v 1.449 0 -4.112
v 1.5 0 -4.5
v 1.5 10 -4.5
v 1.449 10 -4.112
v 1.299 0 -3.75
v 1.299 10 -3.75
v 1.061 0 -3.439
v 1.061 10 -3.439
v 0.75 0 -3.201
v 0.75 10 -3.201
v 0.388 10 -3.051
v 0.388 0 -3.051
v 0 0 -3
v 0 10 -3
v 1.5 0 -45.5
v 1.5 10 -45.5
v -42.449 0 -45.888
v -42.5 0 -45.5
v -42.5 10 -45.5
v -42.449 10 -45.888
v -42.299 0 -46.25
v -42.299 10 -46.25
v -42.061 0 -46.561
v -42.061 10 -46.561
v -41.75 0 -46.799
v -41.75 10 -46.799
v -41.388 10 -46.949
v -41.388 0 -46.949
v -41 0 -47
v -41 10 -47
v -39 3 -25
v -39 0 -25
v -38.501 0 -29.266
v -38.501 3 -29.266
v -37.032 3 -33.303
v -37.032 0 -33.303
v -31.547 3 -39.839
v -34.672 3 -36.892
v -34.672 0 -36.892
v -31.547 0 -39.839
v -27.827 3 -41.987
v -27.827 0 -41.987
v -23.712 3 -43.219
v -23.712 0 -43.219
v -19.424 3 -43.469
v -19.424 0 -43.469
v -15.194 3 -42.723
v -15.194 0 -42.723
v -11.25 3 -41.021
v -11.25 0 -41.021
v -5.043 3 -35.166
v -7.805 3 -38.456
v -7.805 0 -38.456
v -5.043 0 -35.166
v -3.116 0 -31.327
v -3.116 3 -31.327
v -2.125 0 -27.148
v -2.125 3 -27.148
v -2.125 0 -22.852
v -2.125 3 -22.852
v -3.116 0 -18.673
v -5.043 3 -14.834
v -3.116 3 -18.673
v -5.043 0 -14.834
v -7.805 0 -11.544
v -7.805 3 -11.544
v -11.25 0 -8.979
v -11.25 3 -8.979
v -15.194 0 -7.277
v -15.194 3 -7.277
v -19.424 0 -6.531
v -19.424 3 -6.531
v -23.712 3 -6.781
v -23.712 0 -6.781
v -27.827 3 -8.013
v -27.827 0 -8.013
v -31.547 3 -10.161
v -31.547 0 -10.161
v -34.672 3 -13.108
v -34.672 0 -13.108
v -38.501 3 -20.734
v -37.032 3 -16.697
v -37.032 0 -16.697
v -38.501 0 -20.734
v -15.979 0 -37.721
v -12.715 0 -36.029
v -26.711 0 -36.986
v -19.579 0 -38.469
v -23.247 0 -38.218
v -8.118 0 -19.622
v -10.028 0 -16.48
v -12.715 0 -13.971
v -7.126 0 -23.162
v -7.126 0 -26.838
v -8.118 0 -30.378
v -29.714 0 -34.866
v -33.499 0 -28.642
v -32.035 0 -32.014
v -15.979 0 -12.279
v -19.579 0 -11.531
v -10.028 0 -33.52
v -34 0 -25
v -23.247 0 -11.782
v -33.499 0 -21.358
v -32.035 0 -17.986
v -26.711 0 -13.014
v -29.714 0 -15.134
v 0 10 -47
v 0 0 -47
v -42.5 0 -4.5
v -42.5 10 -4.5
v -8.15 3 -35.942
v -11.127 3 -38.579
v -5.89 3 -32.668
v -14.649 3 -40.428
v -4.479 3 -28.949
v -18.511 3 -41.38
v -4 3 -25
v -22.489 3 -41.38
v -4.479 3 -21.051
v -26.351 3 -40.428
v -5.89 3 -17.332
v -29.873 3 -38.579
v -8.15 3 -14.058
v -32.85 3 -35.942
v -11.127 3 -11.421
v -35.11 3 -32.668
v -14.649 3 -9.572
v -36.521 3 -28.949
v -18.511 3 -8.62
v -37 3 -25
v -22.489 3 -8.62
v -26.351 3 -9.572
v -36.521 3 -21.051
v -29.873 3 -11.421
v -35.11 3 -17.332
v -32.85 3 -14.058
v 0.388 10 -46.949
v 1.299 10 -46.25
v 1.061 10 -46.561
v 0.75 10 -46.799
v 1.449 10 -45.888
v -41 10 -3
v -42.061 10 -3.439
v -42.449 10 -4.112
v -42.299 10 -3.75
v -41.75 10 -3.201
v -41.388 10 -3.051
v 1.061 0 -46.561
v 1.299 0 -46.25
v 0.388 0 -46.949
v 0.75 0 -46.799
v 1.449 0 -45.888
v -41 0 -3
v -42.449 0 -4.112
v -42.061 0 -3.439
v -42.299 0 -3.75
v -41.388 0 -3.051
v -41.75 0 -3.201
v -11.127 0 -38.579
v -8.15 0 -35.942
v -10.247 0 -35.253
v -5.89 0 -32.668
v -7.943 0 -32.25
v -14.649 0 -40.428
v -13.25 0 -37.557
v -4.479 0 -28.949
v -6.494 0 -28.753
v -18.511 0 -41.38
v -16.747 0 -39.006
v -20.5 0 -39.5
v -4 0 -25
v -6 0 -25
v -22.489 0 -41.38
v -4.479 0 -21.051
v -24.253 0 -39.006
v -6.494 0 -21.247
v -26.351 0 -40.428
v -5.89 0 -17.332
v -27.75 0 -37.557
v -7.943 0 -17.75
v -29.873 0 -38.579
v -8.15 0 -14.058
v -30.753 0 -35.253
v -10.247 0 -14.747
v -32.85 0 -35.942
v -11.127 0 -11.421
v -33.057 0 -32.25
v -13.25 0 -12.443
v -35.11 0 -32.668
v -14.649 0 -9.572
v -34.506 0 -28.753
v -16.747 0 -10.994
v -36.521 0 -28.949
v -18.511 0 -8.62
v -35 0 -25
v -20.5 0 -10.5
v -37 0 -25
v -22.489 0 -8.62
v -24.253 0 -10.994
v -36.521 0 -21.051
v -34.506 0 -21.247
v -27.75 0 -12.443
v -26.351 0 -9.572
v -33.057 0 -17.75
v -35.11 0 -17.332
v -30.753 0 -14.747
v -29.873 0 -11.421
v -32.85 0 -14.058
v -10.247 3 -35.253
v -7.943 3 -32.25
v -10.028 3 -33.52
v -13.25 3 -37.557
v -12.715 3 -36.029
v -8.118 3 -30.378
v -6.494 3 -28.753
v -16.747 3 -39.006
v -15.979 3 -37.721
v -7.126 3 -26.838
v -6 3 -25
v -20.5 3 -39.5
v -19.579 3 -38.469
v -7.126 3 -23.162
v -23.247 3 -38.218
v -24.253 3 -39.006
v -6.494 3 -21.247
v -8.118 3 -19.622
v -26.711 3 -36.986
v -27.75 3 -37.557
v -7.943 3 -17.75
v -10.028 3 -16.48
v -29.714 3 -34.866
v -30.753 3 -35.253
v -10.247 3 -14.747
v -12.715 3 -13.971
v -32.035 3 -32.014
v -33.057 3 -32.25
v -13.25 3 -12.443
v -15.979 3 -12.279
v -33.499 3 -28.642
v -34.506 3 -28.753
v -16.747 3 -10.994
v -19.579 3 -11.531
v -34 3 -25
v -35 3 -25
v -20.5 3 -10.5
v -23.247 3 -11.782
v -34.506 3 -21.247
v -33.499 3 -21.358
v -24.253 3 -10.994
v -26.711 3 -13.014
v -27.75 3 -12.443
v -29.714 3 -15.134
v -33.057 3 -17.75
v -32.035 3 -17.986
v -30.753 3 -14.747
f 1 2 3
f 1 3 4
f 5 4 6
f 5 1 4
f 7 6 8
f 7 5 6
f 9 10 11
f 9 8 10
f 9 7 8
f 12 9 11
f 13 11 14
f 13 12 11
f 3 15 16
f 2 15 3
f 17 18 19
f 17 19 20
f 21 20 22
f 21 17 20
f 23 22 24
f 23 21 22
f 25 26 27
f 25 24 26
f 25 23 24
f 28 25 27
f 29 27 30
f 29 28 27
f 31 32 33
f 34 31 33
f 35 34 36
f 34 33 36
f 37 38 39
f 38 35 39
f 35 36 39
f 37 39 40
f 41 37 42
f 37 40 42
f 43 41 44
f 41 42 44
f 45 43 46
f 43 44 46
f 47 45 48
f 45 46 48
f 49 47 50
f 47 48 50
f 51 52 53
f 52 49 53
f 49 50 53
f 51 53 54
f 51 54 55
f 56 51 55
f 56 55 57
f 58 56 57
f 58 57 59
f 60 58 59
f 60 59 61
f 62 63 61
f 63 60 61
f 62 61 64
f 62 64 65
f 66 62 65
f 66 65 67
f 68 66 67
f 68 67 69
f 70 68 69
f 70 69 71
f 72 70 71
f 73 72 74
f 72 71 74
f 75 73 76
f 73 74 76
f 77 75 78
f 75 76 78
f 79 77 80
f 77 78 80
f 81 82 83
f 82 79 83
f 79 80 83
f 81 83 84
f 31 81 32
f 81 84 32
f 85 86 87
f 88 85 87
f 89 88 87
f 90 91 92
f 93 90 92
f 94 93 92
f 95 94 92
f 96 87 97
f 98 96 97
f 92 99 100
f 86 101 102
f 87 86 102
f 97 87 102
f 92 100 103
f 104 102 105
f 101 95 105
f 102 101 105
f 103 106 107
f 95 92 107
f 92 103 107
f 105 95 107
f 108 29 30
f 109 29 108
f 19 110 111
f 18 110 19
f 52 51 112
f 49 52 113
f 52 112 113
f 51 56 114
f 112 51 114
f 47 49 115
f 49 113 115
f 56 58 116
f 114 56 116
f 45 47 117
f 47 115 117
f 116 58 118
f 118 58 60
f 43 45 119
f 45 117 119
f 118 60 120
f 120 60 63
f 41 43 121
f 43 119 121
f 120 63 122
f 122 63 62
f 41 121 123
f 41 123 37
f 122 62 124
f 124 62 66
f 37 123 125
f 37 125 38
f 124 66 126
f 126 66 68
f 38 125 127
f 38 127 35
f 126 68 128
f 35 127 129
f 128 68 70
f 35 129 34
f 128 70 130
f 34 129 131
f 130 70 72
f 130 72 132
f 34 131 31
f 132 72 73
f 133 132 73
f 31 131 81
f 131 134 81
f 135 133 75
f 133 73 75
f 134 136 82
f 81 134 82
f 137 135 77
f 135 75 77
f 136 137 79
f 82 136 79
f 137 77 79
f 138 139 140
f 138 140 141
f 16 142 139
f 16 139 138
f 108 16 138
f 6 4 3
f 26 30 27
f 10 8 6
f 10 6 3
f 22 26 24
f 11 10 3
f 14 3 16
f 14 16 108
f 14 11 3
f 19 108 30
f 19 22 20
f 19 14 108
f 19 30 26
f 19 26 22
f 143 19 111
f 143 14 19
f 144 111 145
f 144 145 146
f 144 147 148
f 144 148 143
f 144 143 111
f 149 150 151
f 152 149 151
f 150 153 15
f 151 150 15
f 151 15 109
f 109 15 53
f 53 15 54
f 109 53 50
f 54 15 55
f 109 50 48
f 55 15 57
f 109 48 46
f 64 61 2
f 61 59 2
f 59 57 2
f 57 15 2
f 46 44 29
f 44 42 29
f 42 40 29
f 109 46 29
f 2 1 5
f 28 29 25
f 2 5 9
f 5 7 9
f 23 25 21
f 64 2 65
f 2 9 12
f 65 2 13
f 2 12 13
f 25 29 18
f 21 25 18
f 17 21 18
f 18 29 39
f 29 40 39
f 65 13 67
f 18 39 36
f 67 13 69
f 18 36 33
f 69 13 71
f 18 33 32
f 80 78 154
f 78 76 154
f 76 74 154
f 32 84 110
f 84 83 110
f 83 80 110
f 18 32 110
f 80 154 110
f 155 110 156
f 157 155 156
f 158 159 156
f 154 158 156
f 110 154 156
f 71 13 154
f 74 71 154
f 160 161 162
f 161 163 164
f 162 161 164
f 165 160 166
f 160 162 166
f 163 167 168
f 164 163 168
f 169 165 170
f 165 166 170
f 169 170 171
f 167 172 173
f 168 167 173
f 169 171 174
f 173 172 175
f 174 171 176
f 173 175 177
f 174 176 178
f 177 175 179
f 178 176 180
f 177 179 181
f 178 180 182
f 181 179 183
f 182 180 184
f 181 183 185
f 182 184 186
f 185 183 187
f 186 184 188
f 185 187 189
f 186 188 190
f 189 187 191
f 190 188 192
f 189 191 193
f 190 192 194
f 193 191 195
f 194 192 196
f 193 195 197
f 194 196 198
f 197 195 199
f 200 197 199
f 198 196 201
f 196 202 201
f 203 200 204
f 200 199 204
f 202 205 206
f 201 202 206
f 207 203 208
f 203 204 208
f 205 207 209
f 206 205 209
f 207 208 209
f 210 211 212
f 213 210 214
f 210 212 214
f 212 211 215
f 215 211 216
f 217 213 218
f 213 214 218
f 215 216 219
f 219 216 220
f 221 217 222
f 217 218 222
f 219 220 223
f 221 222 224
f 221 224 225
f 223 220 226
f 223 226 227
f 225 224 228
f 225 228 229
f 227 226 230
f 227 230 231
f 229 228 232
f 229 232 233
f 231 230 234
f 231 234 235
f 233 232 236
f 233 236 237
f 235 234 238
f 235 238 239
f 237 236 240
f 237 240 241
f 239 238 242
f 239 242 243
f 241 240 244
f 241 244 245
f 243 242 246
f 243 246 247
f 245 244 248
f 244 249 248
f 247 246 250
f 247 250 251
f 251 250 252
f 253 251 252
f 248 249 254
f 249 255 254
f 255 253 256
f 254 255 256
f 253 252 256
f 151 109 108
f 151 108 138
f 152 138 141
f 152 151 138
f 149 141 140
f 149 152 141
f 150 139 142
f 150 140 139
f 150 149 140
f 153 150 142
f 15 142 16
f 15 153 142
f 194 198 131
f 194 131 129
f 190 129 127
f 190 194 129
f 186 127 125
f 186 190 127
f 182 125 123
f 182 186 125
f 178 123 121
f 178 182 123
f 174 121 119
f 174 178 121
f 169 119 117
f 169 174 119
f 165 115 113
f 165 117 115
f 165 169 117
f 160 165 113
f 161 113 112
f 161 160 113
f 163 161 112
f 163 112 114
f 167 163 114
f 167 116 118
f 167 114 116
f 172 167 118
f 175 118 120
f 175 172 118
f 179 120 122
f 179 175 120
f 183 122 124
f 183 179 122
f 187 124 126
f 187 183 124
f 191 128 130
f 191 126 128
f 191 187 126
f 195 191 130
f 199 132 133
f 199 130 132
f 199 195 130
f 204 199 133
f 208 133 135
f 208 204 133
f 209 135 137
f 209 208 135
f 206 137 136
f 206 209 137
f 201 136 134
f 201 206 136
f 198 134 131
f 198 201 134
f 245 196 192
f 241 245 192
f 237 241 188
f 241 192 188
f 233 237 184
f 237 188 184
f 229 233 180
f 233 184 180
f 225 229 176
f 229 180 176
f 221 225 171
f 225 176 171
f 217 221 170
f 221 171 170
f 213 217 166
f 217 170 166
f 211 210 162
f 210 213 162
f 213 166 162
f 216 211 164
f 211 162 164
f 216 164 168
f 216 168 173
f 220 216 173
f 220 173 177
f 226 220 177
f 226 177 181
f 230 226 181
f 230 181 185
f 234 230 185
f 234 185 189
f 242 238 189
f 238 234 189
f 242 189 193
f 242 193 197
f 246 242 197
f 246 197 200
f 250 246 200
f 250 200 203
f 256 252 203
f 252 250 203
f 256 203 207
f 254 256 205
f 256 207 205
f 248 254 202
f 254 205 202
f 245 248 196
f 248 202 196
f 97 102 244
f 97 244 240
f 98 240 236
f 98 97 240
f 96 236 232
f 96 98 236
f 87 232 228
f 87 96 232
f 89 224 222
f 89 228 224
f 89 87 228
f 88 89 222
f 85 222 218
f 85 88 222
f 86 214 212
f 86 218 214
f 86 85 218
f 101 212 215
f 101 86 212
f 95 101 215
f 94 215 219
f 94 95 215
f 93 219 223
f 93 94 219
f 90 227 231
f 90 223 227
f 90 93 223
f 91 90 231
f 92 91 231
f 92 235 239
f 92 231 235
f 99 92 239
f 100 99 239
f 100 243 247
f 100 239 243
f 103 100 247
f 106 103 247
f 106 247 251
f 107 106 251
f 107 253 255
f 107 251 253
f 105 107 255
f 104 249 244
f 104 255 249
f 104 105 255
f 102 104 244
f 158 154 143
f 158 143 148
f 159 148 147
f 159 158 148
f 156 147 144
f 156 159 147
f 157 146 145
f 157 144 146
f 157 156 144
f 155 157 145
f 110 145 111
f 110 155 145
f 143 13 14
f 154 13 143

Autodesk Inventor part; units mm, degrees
ref_plane "YZ Plane" through (0, 0, 0) normal (1, 0, 0) x (0, 1, 0)
ref_plane "XZ Plane" through (0, 0, 0) normal (0, 1, 0) x (-1, 0, 0)
ref_plane "XY Plane" through (0, 0, 0) normal (0, 0, 1) x (1, 0, 0)
sketch "Эскиз1" plane through (0, 0, 0) normal (0, 1, 0) x (-1, 0, 0)
  arc A0 (41, -50) -> (45.5, -45.5) centre (41, -45.5) ccw
  line L0 (0, -50) -> (41, -50)
  arc A1 (-4.5, -45.5) -> (0, -50) centre (0, -45.5) ccw
  line L1 (-4.5, -4.5) -> (-4.5, -45.5)
  arc A2 (0, 0) -> (-4.5, -4.5) centre (0, -4.5) ccw
  line L2 (-1.5, -45.5) -> (-1.5, -4.5)
  arc A3 (0, -3) -> (-1.5, -4.5) centre (0, -4.5) ccw
  line L3 (0, -3) -> (41, -3)
  line L4 (41, 0) -> (0, 0)
  arc A4 (45.5, -4.5) -> (41, 0) centre (41, -4.5) ccw
  line L5 (45.5, -45.5) -> (45.5, -4.5)
  line L6 (42.5, -4.5) -> (42.5, -45.5)
  arc A5 (42.5, -4.5) -> (41, -3) centre (41, -4.5) ccw
  line L7 (41, -47) -> (0, -47)
  arc A6 (41, -47) -> (42.5, -45.5) centre (41, -45.5) ccw
  arc A7 (-1.5, -45.5) -> (0, -47) centre (0, -45.5) ccw
  circle A8 centre (20.5, -25) radius 18.5
  circle A9 centre (20.5, -25) radius 16.5
  circle A10 centre (20.5, -25) radius 14.5
  circle A11 centre (20.5, -25) radius 13.5
  point P0 (11.5, -30)
extrude "Выдавливание1" add sketch "Эскиз1" along normal blind 10 contours L2 A3 L3 A5 L6 A6 L7 A7 | A8 | A9 | A10 | A11
extrude "Выдавливание2" cut sketch "Эскиз1" along normal blind 3 contours A8 | A10
properties part number "Cap" material "Стекло, литое, серое"
